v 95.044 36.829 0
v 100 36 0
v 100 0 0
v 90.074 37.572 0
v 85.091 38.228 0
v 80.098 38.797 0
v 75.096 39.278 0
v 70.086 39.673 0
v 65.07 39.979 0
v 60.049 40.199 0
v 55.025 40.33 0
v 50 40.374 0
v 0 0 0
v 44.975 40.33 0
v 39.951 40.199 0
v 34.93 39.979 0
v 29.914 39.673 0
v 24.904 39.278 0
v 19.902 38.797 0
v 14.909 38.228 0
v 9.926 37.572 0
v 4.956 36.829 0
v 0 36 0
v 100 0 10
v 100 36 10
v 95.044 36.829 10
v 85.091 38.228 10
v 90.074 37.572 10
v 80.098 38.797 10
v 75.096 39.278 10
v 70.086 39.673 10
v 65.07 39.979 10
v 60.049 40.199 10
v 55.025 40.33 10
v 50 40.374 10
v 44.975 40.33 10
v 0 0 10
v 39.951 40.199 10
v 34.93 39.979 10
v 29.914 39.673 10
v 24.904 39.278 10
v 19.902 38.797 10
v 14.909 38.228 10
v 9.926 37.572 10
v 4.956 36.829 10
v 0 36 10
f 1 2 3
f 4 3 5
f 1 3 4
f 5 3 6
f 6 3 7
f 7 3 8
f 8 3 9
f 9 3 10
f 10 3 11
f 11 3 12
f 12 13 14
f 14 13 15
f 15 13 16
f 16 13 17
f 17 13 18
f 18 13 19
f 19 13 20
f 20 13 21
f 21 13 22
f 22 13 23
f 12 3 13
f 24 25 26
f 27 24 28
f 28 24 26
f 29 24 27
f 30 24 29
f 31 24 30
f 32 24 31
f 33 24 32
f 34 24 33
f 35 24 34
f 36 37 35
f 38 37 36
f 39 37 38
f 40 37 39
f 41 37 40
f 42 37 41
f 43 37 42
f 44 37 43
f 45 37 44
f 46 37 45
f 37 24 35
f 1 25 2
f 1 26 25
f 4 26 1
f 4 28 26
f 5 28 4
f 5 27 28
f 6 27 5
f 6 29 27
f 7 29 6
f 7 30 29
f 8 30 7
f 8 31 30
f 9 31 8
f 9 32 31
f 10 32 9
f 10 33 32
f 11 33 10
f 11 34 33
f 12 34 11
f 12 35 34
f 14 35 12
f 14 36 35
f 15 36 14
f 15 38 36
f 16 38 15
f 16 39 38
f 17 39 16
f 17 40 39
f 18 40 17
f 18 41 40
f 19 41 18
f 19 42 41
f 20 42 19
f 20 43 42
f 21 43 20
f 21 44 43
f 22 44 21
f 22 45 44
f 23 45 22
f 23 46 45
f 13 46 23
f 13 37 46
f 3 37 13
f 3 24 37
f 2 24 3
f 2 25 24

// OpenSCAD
$fn = 32;

// ----------------------------------------------------------------------
// Arc profile plate: crown, 23 points
// ----------------------------------------------------------------------

// --- parameters (mm) ---
bar_l = 100;              // bar length, X
bar_w = 36;               // bar height at the ends, Y
arc_r = 287.94;           // radius of the crown arc
arc_angle = 20;           // crown arc angle, degrees
crown_rise = 4.37;        // rise of the crown over the ends
arc_step = 1;             // sampling step of the crown arc, degrees
plate_t = 10;             // plate thickness, Z

bbox_y = bar_w + crown_rise;  // full height with the crown

profile = [[100, 36], [95.044, 36.829], [90.074, 37.572], [85.091, 38.228], [80.098, 38.797], [75.096, 39.278], [70.086, 39.673], [65.07, 39.979], [60.049, 40.199], [55.025, 40.33], [50, 40.374], [44.975, 40.33], [39.951, 40.199], [34.93, 39.979], [29.914, 39.673], [24.904, 39.278], [19.902, 38.797], [14.909, 38.228], [9.926, 37.572], [4.956, 36.829], [0, 36], [0, 0], [100, 0]];  // primary outline, 23 points, counter clockwise

// --- the one profile operation ---
linear_extrude(height = plate_t) polygon(points = profile);
